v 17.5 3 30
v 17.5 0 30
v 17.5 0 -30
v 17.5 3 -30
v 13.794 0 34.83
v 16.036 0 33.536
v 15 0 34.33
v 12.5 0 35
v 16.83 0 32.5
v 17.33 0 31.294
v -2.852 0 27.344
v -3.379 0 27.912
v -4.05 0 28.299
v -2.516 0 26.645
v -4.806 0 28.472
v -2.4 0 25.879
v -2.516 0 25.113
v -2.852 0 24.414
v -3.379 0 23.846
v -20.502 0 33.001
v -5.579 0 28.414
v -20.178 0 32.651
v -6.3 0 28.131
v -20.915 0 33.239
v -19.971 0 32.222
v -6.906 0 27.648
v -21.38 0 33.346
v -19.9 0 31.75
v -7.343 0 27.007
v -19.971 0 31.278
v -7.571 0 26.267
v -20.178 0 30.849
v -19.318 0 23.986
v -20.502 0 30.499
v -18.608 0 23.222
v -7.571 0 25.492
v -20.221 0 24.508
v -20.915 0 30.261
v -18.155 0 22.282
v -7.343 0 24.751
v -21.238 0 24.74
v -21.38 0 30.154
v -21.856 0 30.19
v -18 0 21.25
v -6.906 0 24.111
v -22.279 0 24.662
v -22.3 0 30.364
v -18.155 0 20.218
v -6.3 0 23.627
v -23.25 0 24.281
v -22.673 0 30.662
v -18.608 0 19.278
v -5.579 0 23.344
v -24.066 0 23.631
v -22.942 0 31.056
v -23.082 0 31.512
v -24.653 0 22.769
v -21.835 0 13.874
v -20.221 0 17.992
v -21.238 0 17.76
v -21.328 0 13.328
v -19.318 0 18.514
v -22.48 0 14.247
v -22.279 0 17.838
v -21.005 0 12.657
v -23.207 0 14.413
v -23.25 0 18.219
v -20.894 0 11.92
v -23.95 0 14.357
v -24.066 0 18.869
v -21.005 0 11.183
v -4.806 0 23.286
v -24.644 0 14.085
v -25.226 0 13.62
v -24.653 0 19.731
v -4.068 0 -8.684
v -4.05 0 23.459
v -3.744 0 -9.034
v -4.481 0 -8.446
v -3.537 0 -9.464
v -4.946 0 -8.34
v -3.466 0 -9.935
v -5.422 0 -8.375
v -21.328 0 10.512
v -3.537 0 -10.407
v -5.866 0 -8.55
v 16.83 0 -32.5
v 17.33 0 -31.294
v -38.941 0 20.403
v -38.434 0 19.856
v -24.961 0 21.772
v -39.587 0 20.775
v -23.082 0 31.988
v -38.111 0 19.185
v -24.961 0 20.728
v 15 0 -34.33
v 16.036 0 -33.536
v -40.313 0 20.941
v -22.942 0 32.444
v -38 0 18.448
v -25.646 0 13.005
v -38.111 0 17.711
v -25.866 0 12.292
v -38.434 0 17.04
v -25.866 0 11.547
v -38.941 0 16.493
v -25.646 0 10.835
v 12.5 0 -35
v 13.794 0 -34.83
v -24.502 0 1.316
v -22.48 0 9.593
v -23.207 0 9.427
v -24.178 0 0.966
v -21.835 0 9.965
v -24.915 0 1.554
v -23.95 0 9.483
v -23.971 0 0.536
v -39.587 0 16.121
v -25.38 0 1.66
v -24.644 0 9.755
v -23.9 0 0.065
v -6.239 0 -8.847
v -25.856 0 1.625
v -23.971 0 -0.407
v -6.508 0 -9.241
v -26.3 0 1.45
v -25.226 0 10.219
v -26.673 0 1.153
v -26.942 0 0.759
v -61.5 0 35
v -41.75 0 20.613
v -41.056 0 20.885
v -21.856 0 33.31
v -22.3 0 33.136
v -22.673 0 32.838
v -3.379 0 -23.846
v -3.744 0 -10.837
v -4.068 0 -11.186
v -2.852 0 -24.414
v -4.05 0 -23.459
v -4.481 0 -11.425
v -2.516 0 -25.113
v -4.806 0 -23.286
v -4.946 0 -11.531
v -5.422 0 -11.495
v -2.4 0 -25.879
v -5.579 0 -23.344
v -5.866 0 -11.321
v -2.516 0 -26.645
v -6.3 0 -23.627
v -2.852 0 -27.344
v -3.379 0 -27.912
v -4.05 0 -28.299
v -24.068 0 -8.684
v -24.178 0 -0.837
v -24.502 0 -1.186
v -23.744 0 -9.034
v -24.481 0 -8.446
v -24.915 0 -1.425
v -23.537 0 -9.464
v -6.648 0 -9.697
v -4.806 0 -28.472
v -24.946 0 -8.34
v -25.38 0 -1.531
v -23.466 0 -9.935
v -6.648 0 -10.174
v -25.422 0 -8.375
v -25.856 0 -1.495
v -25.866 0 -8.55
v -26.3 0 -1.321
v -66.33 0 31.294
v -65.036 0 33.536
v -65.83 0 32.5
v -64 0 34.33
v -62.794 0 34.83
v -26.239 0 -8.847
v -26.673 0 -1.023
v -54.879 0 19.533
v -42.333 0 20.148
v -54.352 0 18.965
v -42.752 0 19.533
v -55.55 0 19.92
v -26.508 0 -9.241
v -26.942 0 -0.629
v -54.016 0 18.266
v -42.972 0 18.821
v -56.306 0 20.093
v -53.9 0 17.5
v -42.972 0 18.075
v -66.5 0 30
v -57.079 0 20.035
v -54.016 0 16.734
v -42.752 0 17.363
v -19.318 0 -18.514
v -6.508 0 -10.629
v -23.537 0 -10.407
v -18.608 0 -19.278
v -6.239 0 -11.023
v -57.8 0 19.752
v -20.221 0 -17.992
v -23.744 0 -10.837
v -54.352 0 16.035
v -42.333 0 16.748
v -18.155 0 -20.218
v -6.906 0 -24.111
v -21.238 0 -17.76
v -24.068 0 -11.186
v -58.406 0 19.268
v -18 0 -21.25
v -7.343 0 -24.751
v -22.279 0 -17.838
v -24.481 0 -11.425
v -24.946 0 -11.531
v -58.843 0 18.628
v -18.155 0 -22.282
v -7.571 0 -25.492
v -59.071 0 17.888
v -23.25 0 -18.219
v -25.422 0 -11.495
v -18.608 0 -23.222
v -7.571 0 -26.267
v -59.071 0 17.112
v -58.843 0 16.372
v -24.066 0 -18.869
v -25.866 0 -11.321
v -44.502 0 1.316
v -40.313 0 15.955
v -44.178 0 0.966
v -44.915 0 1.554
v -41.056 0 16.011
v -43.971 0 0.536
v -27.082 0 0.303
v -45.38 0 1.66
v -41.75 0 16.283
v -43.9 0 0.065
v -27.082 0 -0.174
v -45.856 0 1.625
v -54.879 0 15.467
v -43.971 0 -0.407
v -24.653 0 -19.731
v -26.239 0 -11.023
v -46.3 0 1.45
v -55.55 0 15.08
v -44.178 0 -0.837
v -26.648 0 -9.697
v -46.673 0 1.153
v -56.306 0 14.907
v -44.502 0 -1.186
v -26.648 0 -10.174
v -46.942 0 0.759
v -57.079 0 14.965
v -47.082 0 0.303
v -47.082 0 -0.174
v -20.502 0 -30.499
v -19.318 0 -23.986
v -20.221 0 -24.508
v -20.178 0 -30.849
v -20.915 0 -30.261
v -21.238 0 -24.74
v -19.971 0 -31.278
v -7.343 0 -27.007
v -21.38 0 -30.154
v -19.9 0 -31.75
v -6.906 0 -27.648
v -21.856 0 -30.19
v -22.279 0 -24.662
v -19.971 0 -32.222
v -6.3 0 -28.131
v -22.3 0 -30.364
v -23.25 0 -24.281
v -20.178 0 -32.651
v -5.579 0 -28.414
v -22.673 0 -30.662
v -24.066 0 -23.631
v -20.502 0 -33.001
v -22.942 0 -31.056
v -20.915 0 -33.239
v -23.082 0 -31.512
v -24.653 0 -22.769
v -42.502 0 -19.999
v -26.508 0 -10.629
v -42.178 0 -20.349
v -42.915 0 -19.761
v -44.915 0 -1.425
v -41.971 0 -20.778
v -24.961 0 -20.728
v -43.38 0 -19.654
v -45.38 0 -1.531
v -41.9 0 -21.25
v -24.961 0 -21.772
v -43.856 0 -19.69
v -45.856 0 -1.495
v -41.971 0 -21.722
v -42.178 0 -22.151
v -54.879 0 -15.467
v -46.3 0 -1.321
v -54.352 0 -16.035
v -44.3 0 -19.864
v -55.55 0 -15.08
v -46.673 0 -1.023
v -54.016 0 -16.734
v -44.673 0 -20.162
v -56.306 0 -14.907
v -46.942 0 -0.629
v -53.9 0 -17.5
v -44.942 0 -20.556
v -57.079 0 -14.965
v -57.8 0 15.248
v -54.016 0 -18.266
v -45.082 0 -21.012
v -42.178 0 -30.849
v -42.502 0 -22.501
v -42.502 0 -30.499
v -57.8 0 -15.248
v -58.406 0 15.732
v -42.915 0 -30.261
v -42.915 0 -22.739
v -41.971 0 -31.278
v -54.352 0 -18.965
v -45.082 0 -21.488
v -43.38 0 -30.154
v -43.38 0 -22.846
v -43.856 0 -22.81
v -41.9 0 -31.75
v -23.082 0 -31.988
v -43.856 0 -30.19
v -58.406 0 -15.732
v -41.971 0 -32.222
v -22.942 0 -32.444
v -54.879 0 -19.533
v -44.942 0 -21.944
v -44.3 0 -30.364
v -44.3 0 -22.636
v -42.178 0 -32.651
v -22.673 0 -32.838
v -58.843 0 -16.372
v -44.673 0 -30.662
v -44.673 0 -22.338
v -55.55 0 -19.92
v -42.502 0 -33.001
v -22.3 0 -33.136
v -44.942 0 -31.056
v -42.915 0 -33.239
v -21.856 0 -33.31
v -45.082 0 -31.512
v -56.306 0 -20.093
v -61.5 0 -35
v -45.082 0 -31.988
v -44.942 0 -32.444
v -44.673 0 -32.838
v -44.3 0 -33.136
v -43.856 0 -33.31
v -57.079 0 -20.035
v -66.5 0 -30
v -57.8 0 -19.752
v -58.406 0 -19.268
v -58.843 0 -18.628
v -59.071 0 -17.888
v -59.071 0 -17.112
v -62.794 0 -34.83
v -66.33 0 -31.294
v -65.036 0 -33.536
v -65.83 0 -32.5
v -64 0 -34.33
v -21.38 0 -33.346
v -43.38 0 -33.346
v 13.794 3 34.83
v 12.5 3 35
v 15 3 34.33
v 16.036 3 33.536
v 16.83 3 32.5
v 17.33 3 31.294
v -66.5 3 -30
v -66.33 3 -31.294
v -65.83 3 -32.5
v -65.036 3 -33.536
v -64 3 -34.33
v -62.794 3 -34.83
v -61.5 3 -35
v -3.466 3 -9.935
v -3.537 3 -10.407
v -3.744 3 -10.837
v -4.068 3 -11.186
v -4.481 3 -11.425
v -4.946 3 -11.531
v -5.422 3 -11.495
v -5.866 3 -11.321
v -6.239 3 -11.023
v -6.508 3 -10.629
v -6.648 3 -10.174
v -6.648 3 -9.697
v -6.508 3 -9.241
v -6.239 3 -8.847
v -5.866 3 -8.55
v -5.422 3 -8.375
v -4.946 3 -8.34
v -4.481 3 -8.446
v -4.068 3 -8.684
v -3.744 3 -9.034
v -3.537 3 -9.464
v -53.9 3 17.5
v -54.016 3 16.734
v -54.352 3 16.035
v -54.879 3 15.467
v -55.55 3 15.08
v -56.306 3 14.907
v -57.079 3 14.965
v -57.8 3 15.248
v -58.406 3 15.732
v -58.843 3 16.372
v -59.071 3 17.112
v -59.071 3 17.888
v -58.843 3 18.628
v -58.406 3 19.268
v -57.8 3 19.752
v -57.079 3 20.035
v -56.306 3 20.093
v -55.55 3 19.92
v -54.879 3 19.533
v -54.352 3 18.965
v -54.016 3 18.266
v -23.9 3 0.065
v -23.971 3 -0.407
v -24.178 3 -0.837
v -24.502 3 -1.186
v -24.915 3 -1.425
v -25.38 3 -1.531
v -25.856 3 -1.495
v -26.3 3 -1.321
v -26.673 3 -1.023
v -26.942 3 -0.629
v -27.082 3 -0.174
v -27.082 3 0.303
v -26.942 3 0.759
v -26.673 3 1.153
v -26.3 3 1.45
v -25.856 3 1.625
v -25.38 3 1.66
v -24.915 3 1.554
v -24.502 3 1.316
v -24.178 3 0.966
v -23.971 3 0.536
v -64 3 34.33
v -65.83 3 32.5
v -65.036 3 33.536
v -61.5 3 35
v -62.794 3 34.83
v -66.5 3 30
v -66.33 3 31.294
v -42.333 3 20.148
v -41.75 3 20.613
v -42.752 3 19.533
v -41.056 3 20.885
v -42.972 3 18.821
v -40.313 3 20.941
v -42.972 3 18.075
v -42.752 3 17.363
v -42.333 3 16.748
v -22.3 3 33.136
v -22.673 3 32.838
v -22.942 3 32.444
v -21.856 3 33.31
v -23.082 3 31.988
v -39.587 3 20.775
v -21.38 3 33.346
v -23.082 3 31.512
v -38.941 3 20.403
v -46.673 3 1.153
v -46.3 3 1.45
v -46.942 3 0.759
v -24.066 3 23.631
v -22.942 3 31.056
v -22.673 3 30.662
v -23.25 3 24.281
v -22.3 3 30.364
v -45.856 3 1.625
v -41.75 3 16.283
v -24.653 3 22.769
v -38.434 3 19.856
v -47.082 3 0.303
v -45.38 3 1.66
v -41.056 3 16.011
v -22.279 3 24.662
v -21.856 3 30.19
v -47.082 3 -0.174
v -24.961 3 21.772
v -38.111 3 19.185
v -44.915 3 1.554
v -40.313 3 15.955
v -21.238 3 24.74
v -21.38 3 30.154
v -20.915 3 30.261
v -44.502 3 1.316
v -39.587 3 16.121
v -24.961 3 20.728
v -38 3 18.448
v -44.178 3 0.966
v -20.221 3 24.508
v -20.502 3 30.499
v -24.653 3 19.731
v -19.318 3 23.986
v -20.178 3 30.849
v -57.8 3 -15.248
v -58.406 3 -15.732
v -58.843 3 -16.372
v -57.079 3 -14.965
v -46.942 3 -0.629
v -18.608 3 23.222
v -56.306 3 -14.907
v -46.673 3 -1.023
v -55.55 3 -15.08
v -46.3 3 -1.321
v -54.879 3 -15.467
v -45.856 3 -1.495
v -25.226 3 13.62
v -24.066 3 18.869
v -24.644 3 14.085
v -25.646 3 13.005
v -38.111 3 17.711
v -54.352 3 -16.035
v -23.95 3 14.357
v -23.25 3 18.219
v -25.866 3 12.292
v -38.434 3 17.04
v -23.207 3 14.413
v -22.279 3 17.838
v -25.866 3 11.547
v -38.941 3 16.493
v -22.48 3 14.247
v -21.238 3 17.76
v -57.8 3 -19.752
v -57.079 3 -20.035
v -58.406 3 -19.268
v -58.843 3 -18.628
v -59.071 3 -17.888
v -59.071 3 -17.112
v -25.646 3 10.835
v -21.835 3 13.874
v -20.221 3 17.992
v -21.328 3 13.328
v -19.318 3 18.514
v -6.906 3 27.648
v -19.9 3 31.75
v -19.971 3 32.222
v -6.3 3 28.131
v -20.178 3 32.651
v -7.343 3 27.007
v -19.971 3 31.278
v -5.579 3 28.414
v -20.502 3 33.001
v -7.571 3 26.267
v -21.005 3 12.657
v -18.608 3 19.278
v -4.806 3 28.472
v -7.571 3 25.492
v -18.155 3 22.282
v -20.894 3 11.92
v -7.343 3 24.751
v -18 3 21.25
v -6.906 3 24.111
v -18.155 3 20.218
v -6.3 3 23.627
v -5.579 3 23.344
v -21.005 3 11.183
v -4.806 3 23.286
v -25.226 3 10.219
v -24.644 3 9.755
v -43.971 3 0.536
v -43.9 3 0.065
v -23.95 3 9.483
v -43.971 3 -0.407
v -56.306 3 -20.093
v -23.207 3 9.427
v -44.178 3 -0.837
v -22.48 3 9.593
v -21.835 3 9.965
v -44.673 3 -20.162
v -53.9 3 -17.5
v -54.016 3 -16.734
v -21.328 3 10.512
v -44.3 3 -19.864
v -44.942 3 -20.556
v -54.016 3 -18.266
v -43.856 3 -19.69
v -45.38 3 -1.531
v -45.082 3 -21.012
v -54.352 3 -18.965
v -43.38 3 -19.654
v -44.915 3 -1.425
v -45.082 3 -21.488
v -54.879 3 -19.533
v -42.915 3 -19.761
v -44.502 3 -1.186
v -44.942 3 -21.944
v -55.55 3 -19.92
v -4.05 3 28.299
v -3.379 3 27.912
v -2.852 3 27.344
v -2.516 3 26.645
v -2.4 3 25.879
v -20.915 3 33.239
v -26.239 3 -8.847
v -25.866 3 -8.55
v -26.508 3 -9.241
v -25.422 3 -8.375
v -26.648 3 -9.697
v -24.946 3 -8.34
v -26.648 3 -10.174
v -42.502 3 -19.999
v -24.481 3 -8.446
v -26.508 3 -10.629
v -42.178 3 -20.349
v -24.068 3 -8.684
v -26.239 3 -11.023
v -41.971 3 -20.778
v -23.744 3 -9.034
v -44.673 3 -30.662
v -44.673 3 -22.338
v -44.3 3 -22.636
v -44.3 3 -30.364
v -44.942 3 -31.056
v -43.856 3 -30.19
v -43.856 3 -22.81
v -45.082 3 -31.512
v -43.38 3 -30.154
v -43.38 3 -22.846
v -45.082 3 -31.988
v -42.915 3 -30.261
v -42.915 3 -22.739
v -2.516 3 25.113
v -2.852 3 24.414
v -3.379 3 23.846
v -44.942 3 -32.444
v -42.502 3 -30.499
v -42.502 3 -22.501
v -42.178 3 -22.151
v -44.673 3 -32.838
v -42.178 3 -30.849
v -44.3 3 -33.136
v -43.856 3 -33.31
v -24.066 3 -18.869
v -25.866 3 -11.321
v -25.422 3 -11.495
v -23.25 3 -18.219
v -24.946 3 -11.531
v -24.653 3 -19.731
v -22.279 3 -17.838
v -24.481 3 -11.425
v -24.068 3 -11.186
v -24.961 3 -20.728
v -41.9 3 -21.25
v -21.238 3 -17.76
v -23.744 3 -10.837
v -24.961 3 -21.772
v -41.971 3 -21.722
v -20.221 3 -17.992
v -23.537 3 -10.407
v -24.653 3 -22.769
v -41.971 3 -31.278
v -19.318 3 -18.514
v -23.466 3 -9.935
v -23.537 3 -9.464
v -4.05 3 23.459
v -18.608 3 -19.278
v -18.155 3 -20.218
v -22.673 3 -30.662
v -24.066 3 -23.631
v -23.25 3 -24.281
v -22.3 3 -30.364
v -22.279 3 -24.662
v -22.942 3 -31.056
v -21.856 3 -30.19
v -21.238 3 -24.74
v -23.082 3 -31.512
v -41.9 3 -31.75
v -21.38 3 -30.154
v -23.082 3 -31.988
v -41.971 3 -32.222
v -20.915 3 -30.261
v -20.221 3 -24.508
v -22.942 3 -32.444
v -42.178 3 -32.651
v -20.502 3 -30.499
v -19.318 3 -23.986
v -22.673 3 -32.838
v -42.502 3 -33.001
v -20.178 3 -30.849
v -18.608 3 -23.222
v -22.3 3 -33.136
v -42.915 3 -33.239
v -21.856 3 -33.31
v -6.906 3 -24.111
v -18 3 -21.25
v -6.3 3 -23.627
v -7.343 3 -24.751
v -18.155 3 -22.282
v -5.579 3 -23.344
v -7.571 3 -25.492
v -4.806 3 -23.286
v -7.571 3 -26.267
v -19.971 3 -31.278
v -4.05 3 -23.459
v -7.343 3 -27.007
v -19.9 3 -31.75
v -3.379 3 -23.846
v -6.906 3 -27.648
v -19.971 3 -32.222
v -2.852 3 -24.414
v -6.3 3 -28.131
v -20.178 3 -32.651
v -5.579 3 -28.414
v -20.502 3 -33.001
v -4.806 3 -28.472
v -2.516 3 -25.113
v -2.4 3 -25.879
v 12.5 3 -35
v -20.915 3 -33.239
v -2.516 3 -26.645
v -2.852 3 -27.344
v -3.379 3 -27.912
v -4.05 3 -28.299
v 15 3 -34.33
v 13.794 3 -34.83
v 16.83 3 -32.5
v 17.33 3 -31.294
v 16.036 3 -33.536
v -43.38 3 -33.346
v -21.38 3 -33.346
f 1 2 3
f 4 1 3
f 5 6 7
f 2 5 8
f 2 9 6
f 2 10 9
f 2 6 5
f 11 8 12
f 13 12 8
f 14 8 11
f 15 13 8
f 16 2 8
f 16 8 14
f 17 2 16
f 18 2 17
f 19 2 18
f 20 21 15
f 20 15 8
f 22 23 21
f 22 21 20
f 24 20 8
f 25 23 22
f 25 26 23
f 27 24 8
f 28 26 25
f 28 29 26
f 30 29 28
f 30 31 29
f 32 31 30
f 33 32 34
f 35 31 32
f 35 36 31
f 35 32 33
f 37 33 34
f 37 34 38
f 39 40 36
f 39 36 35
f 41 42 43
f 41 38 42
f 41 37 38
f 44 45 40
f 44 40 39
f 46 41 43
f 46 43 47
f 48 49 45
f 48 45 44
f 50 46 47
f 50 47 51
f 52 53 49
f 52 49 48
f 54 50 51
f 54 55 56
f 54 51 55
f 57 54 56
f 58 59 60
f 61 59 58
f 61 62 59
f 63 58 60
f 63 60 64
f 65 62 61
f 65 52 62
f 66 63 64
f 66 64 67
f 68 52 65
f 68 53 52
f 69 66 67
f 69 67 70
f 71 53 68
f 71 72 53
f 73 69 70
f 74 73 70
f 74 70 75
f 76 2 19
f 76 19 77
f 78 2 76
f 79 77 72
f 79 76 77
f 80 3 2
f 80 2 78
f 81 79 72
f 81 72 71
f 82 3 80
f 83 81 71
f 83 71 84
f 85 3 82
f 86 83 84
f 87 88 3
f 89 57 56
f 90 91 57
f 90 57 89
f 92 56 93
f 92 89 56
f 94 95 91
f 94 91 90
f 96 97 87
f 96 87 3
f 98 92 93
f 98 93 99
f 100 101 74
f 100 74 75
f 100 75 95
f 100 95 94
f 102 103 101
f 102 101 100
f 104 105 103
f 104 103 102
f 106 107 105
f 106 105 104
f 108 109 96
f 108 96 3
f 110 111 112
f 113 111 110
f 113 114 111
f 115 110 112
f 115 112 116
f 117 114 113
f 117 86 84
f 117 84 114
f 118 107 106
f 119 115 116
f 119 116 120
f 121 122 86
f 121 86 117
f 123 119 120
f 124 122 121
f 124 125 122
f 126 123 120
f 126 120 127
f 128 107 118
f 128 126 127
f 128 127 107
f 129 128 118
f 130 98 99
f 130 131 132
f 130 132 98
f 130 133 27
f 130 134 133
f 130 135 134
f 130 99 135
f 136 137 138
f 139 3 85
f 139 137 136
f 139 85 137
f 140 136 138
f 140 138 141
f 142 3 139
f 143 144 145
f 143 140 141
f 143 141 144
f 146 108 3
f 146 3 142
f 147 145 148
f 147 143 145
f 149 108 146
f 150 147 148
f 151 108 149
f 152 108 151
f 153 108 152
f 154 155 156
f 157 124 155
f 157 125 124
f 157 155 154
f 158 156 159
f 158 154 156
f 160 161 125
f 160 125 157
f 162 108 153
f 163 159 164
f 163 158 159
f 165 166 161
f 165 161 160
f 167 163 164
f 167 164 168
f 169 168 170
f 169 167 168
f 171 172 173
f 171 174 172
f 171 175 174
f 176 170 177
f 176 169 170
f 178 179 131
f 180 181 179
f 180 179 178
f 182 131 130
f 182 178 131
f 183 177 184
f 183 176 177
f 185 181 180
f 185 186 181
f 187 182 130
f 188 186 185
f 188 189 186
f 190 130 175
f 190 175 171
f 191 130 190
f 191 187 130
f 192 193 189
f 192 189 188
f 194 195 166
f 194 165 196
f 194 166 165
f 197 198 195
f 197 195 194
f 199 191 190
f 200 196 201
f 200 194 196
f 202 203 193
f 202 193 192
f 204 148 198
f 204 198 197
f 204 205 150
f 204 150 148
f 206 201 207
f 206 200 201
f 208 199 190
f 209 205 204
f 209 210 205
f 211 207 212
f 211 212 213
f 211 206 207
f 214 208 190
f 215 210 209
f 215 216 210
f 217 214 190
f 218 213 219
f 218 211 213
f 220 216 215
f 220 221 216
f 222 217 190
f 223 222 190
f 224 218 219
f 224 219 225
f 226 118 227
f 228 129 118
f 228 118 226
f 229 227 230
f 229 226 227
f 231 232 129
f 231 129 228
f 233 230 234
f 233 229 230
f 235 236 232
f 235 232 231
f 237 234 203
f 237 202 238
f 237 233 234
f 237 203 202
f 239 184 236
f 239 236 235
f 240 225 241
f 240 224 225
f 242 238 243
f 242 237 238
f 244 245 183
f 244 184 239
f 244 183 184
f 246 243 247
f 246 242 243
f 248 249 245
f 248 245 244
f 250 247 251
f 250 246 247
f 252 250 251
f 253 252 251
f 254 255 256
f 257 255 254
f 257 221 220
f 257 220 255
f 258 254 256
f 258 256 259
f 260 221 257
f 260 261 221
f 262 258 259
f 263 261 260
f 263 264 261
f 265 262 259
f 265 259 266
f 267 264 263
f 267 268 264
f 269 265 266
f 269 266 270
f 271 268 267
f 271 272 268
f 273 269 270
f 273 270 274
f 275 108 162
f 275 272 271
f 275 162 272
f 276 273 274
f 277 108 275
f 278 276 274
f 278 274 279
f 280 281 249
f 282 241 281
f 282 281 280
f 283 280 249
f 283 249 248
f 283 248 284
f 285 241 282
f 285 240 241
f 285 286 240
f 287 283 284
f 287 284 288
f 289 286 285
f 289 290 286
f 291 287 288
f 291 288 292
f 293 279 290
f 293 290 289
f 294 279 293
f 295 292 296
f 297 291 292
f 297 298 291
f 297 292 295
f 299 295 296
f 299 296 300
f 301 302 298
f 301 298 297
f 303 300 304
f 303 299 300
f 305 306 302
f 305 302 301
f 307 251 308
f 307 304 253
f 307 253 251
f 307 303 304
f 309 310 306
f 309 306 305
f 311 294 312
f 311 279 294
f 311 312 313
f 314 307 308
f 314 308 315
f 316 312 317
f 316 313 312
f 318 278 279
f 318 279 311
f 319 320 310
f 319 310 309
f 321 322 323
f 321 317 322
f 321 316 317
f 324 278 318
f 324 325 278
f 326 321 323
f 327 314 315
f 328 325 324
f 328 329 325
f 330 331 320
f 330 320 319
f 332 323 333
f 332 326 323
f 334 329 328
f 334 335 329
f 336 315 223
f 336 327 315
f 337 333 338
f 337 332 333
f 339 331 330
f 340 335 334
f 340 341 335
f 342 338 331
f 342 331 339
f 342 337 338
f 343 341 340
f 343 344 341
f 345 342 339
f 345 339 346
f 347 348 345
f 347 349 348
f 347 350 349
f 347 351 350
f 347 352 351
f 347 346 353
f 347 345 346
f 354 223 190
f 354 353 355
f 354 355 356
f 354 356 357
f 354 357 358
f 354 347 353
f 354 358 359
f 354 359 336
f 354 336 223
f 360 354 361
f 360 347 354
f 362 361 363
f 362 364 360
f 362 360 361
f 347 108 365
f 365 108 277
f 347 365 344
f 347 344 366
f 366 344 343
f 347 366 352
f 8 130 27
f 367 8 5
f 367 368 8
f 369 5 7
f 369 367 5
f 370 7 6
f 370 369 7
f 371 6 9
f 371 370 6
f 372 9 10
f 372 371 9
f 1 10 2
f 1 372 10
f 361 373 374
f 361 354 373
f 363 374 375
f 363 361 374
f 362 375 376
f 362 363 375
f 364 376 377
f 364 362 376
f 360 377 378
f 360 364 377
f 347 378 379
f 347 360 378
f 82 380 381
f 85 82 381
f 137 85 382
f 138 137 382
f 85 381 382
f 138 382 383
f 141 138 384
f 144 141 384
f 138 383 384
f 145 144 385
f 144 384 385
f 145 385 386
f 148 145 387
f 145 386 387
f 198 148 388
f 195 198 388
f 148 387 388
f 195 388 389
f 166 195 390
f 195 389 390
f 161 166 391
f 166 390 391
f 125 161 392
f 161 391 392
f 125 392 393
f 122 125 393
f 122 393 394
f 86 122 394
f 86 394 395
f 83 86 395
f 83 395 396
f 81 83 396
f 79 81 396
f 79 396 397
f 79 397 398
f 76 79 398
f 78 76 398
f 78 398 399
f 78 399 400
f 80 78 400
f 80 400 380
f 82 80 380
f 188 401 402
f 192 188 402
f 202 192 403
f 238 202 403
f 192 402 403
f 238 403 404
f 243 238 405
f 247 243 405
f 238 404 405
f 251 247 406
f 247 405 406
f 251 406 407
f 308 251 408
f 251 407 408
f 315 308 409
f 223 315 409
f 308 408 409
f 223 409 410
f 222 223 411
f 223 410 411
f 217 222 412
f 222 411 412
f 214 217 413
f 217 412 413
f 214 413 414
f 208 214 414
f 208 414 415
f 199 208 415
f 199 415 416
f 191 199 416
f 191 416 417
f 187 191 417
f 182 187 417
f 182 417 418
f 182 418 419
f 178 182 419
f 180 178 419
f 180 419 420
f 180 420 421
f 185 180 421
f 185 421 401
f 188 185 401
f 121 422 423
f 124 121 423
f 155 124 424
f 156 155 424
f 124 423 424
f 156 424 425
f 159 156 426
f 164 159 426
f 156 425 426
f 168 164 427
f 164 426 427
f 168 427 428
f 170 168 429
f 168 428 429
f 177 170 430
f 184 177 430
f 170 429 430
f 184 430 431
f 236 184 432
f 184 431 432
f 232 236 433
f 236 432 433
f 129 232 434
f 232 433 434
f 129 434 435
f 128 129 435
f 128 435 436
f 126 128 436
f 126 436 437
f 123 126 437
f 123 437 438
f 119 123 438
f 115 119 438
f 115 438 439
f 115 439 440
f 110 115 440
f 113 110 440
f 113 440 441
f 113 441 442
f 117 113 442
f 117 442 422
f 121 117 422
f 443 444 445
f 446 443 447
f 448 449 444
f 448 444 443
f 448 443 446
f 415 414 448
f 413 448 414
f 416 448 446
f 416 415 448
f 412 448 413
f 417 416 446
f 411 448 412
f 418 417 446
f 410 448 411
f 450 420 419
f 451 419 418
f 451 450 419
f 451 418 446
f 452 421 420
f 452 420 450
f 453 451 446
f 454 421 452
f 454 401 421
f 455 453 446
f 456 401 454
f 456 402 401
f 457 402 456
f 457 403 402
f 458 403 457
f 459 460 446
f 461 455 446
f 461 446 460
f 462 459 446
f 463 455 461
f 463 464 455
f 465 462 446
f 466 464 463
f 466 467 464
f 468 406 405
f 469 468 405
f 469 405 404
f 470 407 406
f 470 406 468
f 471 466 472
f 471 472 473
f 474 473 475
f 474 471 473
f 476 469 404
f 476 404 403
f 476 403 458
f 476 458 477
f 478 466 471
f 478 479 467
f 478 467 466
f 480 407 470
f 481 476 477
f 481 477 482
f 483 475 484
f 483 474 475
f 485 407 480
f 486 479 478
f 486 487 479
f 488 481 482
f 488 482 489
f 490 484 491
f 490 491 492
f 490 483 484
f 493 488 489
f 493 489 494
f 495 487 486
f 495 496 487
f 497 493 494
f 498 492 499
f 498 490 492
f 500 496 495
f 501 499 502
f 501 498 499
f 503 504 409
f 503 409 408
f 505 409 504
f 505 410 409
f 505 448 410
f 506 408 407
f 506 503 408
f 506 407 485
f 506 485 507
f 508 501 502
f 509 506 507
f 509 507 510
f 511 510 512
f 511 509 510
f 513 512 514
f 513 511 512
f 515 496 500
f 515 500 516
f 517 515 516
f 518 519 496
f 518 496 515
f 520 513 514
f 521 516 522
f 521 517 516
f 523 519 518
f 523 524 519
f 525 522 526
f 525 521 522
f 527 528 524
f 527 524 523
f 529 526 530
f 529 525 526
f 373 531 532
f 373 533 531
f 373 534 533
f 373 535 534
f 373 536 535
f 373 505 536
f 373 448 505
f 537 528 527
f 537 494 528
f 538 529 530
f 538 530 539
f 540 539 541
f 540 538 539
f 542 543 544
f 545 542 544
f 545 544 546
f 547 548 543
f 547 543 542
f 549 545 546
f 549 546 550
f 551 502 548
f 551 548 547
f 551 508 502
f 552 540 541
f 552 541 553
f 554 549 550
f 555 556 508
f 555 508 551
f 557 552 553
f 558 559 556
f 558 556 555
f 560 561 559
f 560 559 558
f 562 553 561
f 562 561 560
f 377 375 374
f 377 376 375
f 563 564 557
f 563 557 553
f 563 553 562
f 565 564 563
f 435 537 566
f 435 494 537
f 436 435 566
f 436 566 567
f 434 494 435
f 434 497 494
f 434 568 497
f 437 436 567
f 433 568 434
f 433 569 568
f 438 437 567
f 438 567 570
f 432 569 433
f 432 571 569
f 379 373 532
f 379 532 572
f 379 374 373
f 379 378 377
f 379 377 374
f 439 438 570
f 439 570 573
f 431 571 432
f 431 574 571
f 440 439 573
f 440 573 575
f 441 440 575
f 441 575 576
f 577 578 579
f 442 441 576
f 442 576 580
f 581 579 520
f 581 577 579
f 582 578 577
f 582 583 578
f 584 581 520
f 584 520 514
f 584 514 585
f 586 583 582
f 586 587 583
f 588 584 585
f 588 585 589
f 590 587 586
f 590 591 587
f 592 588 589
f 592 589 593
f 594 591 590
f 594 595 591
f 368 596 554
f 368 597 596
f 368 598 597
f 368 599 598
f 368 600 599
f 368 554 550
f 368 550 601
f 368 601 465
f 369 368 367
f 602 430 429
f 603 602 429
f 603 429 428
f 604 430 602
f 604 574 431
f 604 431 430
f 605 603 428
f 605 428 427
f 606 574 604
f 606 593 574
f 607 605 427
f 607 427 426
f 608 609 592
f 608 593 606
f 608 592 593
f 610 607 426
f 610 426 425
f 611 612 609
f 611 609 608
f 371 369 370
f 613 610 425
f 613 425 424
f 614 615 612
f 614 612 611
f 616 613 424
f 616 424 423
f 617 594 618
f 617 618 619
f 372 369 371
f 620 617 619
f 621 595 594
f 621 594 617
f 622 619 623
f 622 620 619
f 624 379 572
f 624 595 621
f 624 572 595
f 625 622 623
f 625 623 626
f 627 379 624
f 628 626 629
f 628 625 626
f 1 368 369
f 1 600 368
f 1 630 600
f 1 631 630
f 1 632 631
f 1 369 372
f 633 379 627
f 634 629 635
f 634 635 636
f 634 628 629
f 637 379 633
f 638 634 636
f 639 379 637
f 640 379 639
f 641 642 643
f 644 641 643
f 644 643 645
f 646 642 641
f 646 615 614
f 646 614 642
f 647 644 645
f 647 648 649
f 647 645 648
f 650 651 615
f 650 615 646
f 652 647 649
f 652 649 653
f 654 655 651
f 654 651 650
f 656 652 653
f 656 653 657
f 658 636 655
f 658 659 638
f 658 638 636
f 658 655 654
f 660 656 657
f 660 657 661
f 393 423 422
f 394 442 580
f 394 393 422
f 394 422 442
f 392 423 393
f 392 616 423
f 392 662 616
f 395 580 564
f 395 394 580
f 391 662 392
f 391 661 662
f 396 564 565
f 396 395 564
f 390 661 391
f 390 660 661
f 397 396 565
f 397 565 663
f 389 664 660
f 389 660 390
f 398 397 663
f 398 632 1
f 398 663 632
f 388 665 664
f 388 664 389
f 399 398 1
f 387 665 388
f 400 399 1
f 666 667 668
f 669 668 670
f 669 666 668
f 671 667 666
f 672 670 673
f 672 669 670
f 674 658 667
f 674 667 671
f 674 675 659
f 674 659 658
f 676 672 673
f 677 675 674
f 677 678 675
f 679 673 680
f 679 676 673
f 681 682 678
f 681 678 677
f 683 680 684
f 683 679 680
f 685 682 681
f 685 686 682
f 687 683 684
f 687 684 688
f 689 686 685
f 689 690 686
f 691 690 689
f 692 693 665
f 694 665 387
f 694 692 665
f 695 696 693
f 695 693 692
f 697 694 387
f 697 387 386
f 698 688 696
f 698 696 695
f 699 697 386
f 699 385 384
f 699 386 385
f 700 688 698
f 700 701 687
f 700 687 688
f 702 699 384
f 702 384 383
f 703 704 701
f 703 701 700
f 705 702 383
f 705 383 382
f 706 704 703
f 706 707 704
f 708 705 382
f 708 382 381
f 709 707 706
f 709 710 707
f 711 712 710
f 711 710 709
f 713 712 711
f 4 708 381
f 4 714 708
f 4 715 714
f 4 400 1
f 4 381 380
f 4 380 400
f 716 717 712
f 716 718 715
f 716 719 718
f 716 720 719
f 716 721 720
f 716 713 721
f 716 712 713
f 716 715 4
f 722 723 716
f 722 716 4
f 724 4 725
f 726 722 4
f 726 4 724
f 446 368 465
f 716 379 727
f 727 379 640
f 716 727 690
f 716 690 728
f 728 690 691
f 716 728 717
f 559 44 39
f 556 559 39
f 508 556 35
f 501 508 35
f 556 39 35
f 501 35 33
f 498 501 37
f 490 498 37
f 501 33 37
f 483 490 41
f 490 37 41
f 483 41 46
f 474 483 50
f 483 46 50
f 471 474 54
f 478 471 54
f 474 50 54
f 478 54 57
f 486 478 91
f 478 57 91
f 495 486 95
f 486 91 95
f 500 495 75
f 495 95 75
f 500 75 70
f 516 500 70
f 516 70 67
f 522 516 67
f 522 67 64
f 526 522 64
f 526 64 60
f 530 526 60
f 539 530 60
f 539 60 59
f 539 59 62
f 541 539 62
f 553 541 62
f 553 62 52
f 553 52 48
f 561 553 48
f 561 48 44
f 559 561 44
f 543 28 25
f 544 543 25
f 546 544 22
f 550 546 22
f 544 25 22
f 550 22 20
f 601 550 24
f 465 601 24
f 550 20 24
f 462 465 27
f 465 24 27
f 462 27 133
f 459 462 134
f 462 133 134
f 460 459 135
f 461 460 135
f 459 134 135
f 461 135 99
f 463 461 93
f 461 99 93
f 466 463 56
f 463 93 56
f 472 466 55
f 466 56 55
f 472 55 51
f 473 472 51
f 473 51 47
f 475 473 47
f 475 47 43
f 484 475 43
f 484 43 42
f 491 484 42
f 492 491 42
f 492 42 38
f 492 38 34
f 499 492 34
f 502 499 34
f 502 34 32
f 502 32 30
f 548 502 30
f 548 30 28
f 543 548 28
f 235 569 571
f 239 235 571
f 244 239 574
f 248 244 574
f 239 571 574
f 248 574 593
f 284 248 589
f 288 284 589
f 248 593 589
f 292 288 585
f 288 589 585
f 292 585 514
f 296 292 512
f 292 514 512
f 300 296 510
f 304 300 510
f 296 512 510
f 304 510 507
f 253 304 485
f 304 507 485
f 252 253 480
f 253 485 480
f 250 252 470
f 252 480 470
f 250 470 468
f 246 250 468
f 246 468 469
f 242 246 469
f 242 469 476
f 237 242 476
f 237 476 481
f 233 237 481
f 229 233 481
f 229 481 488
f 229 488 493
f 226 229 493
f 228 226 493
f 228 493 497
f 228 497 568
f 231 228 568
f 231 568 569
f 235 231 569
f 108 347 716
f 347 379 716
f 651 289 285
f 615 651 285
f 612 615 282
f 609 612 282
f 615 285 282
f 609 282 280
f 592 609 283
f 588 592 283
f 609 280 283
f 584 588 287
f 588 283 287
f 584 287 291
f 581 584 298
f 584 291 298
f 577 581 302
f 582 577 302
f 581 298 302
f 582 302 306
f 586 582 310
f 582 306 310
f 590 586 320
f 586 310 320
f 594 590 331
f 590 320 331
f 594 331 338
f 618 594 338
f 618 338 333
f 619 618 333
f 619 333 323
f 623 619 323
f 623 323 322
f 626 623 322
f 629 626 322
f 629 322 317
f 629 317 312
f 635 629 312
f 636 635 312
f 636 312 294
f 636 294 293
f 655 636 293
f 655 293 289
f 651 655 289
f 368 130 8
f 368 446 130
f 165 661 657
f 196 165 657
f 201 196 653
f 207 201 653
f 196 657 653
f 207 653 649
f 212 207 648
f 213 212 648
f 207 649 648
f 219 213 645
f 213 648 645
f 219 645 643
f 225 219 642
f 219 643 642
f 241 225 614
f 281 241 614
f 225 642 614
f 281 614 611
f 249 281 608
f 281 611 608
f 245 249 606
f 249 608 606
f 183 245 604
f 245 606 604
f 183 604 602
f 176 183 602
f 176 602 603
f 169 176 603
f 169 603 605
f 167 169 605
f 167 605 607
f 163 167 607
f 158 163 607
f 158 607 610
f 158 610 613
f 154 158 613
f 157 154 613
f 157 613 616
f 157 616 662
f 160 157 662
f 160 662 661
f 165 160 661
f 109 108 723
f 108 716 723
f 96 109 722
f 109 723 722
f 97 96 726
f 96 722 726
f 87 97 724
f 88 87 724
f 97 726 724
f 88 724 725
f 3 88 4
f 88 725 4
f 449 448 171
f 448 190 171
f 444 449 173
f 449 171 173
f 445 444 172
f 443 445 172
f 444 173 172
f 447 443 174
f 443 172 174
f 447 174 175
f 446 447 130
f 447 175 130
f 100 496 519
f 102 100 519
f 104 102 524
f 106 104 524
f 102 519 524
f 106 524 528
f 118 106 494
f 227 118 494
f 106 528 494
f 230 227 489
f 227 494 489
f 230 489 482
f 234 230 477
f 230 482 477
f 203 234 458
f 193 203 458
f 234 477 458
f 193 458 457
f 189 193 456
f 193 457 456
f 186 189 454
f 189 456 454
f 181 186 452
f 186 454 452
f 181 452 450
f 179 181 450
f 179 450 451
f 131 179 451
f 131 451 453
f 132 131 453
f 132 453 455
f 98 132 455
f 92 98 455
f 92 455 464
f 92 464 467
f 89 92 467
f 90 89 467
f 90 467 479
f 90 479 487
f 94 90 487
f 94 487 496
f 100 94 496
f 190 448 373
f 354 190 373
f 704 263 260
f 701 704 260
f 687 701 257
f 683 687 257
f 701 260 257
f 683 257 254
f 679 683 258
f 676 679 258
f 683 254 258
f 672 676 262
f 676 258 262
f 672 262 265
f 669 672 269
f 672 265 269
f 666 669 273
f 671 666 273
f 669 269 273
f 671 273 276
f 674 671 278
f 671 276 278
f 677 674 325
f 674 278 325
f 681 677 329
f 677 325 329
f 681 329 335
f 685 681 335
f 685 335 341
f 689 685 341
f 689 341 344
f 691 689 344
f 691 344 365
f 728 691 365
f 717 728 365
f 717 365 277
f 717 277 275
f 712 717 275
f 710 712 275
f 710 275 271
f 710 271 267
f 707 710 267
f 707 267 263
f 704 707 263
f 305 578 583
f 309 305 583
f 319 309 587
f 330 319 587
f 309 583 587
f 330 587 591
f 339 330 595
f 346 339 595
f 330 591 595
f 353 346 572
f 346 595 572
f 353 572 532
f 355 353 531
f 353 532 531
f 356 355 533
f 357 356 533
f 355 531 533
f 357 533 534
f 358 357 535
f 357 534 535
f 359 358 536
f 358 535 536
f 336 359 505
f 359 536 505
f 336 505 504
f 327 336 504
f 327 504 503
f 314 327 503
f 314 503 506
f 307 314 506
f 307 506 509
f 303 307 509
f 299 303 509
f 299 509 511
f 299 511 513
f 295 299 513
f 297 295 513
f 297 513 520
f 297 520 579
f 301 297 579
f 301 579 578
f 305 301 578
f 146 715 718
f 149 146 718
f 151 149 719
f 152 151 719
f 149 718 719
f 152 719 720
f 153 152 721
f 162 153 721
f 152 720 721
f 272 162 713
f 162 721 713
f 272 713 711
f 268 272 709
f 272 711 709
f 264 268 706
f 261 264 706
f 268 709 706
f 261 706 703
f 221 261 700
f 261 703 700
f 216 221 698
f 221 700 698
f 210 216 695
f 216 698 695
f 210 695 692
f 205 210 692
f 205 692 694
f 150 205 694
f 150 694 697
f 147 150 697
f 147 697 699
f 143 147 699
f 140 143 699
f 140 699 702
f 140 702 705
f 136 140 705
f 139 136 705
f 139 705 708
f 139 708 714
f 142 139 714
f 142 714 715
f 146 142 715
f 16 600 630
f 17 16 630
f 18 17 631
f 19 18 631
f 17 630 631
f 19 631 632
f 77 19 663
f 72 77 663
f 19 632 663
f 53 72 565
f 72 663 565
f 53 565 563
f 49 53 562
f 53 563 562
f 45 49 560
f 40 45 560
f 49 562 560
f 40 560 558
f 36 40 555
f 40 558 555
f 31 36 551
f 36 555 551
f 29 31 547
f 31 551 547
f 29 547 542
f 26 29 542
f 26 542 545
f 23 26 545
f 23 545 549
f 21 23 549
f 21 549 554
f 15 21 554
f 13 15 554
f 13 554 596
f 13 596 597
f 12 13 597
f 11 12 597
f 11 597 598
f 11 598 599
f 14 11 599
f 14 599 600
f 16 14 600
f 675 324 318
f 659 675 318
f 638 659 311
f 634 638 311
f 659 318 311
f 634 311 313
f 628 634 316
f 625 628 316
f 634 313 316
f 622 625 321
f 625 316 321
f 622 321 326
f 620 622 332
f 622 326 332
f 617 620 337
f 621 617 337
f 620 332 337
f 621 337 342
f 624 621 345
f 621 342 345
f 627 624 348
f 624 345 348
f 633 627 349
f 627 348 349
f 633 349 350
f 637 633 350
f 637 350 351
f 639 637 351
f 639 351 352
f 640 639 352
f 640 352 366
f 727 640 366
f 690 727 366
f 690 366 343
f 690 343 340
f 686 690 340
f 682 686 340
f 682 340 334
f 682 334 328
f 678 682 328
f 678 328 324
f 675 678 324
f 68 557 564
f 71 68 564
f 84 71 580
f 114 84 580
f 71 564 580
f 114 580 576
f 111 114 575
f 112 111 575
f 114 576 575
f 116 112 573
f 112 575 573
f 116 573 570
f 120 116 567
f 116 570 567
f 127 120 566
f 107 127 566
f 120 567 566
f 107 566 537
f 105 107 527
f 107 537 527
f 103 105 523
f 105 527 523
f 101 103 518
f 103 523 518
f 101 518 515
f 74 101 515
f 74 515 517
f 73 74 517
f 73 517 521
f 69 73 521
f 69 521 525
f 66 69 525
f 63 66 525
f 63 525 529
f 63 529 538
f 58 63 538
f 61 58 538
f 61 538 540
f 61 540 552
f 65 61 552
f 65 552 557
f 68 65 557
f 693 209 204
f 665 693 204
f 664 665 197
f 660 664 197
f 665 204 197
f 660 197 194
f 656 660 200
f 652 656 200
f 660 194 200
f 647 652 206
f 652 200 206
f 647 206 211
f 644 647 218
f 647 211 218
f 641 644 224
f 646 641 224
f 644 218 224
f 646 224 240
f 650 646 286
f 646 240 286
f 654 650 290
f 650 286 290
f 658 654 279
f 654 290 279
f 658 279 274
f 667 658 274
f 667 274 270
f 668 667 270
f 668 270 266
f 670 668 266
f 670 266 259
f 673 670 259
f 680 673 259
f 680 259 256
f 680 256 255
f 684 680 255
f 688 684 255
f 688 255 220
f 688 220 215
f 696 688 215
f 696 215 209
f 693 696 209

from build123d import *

# Parameters (mm, degrees)
SKETCH_1_W             = 35
SKETCH_1_H             = 70
SKETCH_1_R             = 2.6
EXTRUDE_528_DEPTH      = 3
SKETCH_2_R             = 2.1
CUT_EXTRUDE_M4_DEPTH   = 3
SKETCH_3_R             = 2.6
EXTRUDE_990_DEPTH      = 3
SKETCH_4_R             = 2.1
CUT_EXTRUDE_1335_DEPTH = 4
SKETCH_5_W             = 49
SKETCH_5_H             = 70
EXTRA_DEPTH            = 3
SKETCH_6_R             = 2.1
CUT_EXTRUDE_2079_DEPTH = 10
SKETCH_7_R             = 2.1
ETRA_DEPTH             = 10
SKETCH_10_R            = 1.6
SKETCH_10_R_2          = 3.5
CUT_EXTRUDE_3705_DEPTH = 4
FILLET_5_0_R           = 5
SKETCH_12_R            = 2.1
EXTRUDE_1_DEPTH        = 3
SKETCH_13_R            = 1.5
CUT_EXTRUDE_1_DEPTH    = 4
SKETCH_14_R            = 1.5
EXTRUDE_2_DEPTH        = 3
SKETCH_15_R            = 2.5
CUT_EXTRUDE_2_DEPTH    = 4
SKETCH_16_R            = 2.6
EXTRUDE_3_DEPTH        = 3
SKETCH_18_R            = 2.5
CUT_EXTRUDE_3_DEPTH    = 3
SKETCH_19_R            = 2.180798689
SKETCH_19_R_2          = 1.661770768
EXTRUDE_4_DEPTH        = 3
SKETCH_20_R            = 2.5
CUT_EXTRUDE_4_DEPTH    = 4
SKETCH_21_R            = 1.5
SKETCH_21_R_2          = 2.5
SKETCH_21_R_3          = 2.1
EXTRUDE_5_DEPTH        = 3
SKETCH_22_R            = 1.5
CUT_EXTRUDE_5_DEPTH    = 4
SKETCH_23_R            = 1.5
EXTRUDE_6_DEPTH        = 3
SKETCH_24_R            = 1.2
CUT_EXTRUDE_8_DEPTH    = 4
SKETCH_26_R            = 1.5
CUT_EXTRUDE_10_DEPTH   = 4
SKETCH_27_R            = 1.2
SKETCH_27_R_2          = 1.228912634
EXTRUDE_7_DEPTH        = 3
SKETCH_28_R            = 2.5
EXTRUDE_8_DEPTH        = 3
SKETCH_29_R            = 1.2
CUT_EXTRUDE_11_DEPTH   = 4
SKETCH_30_R            = 1.5
EXTRUDE_9_DEPTH        = 3
SKETCH_31_R            = 2.5
CUT_EXTRUDE_12_DEPTH   = 4
SKETCH_32_R            = 2.622023652
SKETCH_32_R_2          = 2.1
EXTRUDE_10_DEPTH       = 3
SKETCH_34_R            = 2.5
EXTRUDE_11_DEPTH       = 3
SKETCH_35_R            = 1.2
CUT_EXTRUDE_13_DEPTH   = 4
SKETCH_37_R            = 1.6
SKETCH_37_R_2          = 2.6
CUT_EXTRUDE_14_DEPTH   = 4


with BuildPart() as part:
    # 草图1 → Extrude 528 (new body)
    with BuildSketch(Plane(origin=(0, 0, 0), x_dir=(1, 0, 0), z_dir=(0, 1, 0))):
        Rectangle(SKETCH_1_W, SKETCH_1_H)
        with Locations((-7.5, 22.5)):
            Circle(SKETCH_1_R, mode=Mode.SUBTRACT)
        with Locations((-7.5, 0)):
            Circle(SKETCH_1_R, mode=Mode.SUBTRACT)
        with Locations((-7.5, -22.5)):
            Circle(SKETCH_1_R, mode=Mode.SUBTRACT)
        with Locations((-7.5, 10)):
            Circle(SKETCH_1_R, mode=Mode.SUBTRACT)
        with Locations((-7.5, -10)):
            Circle(SKETCH_1_R, mode=Mode.SUBTRACT)
    extrude(amount=EXTRUDE_528_DEPTH)

    # 草图2 → M4铝柱 (cut)
    with BuildSketch(Plane(origin=(0, 3, 0), x_dir=(1, 0, 0), z_dir=(0, 1, 0))):
        with Locations((10, 0)):
            Circle(SKETCH_2_R)
    extrude(amount=-CUT_EXTRUDE_M4_DEPTH, mode=Mode.SUBTRACT)

    # 草图3 → Extrude 990 (add, through all)
    with BuildSketch(Plane(origin=(0, 3, 0), x_dir=(1, 0, 0), z_dir=(0, 1, 0))):
        with Locations((-7.5, -10)):
            Circle(SKETCH_3_R)
        with Locations((-7.5, 10)):
            Circle(SKETCH_3_R)
    extrude(amount=-EXTRUDE_990_DEPTH)

    # 草图4 → Cut-Extrude 1335 (cut, through all)
    with BuildSketch(Plane(origin=(0, 3, 0), x_dir=(1, 0, 0), z_dir=(0, 1, 0))):
        with Locations((10, 22.5)):
            Circle(SKETCH_4_R)
        with Locations((10, -22.5)):
            Circle(SKETCH_4_R)
    extrude(amount=-CUT_EXTRUDE_1335_DEPTH, mode=Mode.SUBTRACT)

    # 草图5 → EXTRA (add, through all)
    with BuildSketch(Plane(origin=(0, 3, 0), x_dir=(1, 0, 0), z_dir=(0, 1, 0))):
        with Locations((-42, 0)):
            Rectangle(SKETCH_5_W, SKETCH_5_H)
    extrude(amount=-EXTRA_DEPTH)

    # 草图6 → Cut-Extrude 2079 (cut)
    with BuildSketch(Plane(origin=(0, 3, 0), x_dir=(1, 0, 0), z_dir=(0, 1, 0))):
        with Locations((-44.5, 0)):
            Circle(SKETCH_6_R)
        with Locations((-36.5, 0)):
            Circle(SKETCH_6_R)
    extrude(amount=-CUT_EXTRUDE_2079_DEPTH, mode=Mode.SUBTRACT)

    # 草图7 → ETRA铝柱 (cut)
    with BuildSketch(Plane(origin=(0, 3, 0), x_dir=(1, 0, 0), z_dir=(0, 1, 0))):
        with Locations((-56.5, 17.5)):
            Circle(SKETCH_7_R)
        with Locations((-56.5, -17.5)):
            Circle(SKETCH_7_R)
    extrude(amount=-ETRA_DEPTH, mode=Mode.SUBTRACT)

    # 草图10 → Cut-Extrude 3705 (cut, through all)
    with BuildSketch(Plane.XZ):
        with Locations((-43.5, -21.25)):
            Circle(SKETCH_10_R)
        with Locations((-21.5, -31.75)):
            Circle(SKETCH_10_R)
        with Locations((-43.5, -31.75)):
            Circle(SKETCH_10_R)
        with Locations((-43.5, 21.25)):
            Circle(SKETCH_10_R)
        with Locations((-21.5, 31.75)):
            Circle(SKETCH_10_R)
        with Locations((-43.5, 31.75)):
            Circle(SKETCH_10_R)
        with Locations((-21.5, 21.25)):
            Circle(SKETCH_10_R_2)
        with Locations((-21.5, -21.25)):
            Circle(SKETCH_10_R_2)
    extrude(amount=-CUT_EXTRUDE_3705_DEPTH, mode=Mode.SUBTRACT)

    # 圆角5.0
    fillet_5_0_edges = [part.edges().sort_by_distance(p)[0] for p in [
        (-66.5, 1.5, 35),
        (-66.5, 1.5, -35),
        (17.5, 1.5, 35),
        (17.5, 1.5, -35),
    ]]
    fillet(fillet_5_0_edges, radius=FILLET_5_0_R)

    # 草图12 → 凸台-拉伸1 (add)
    with BuildSketch(Plane(origin=(0, 3, 0), x_dir=(1, 0, 0), z_dir=(0, 1, 0))):
        with Locations((-36.5, 0)):
            Circle(SKETCH_12_R)
        with Locations((-44.5, 0)):
            Circle(SKETCH_12_R)
    extrude(amount=-EXTRUDE_1_DEPTH)

    # 草图13 → 切除-拉伸1 (cut, through all)
    with BuildSketch(Plane(origin=(0, 3, 0), x_dir=(1, 0, 0), z_dir=(0, 1, 0))):
        with Locations((-52.499999555, 1.426e-06)):
            Circle(SKETCH_13_R)
        with Locations((-28.499999555, 1.44e-06)):
            Circle(SKETCH_13_R)
    extrude(amount=-CUT_EXTRUDE_1_DEPTH, mode=Mode.SUBTRACT)

    # 草图14 → 凸台-拉伸2 (add)
    with BuildSketch(Plane(origin=(0, 3, 0), x_dir=(1, 0, 0), z_dir=(0, 1, 0))):
        with Locations((-28.499999555, 1.44e-06)):
            Circle(SKETCH_14_R)
    extrude(amount=-EXTRUDE_2_DEPTH)

    # 草图15 → 切除-拉伸2 (cut, through all)
    with BuildSketch(Plane(origin=(0, 3, 0), x_dir=(1, 0, 0), z_dir=(0, 1, 0))):
        with Locations((-23.393651392, 12.166497951)):
            Circle(SKETCH_15_R)
        with Locations((-23.393651594, -11.919830539)):
            Circle(SKETCH_15_R)
    extrude(amount=-CUT_EXTRUDE_2_DEPTH, mode=Mode.SUBTRACT)

    # 草图16 → 凸台-拉伸3 (add)
    with BuildSketch(Plane(origin=(0, 3, 0), x_dir=(1, 0, 0), z_dir=(0, 1, 0))):
        with Locations((-7.5, 22.5)):
            Circle(SKETCH_16_R)
        with Locations((-7.5, 0)):
            Circle(SKETCH_16_R)
        with Locations((-7.5, -22.5)):
            Circle(SKETCH_16_R)
    extrude(amount=-EXTRUDE_3_DEPTH)

    # 草图18 → 切除-拉伸3 (cut)
    with BuildSketch(Plane.XZ):
        with Locations((-3.558761246, 0)):
            Circle(SKETCH_18_R)
        with Locations((-3.558761246, 22.202338419)):
            Circle(SKETCH_18_R)
        with Locations((-3.558761246, -23.518793957)):
            Circle(SKETCH_18_R)
    extrude(amount=-CUT_EXTRUDE_3_DEPTH, mode=Mode.SUBTRACT)

    # 草图19 → 凸台-拉伸4 (add)
    with BuildSketch(Plane.XZ):
        with Locations((-43.5, 21.25)):
            Circle(SKETCH_19_R)
        with Locations((-43.5, 31.75)):
            Circle(SKETCH_19_R_2)
    extrude(amount=-EXTRUDE_4_DEPTH)

    # 草图20 → 切除-拉伸4 (cut, through all)
    with BuildSketch(Plane(origin=(0, 3, 0), x_dir=(1, 0, 0), z_dir=(0, 1, 0))):
        with Locations((-40.5, 1.551947464)):
            Circle(SKETCH_20_R)
        with Locations((-40.5, -18.448052536)):
            Circle(SKETCH_20_R)
    extrude(amount=-CUT_EXTRUDE_4_DEPTH, mode=Mode.SUBTRACT)

    # 草图21 → 凸台-拉伸5 (add)
    with BuildSketch(Plane(origin=(0, 3, 0), x_dir=(1, 0, 0), z_dir=(0, 1, 0))):
        with Locations((-52.499999555, 1.426e-06)):
            Circle(SKETCH_21_R)
        with Locations((-40.5, 1.551947464)):
            Circle(SKETCH_21_R_2)
        with Locations((-3.558761246, 0)):
            Circle(SKETCH_21_R_2)
        with Locations((10, 0)):
            Circle(SKETCH_21_R_3)
    extrude(amount=-EXTRUDE_5_DEPTH)

    # 草图22 → 切除-拉伸5 (cut, through all)
    with BuildSketch(Plane(origin=(0, 3, 0), x_dir=(1, 0, 0), z_dir=(0, 1, 0))):
        with Locations((-52.5, 0)):
            Circle(SKETCH_22_R)
        with Locations((-28.5, 0)):
            Circle(SKETCH_22_R)
    extrude(amount=-CUT_EXTRUDE_5_DEPTH, mode=Mode.SUBTRACT)

    # 草图23 → 凸台-拉伸6 (add)
    with BuildSketch(Plane(origin=(0, 3, 0), x_dir=(1, 0, 0), z_dir=(0, 1, 0))):
        with Locations((-52.5, 0)):
            Circle(SKETCH_23_R)
        with Locations((-28.5, 0)):
            Circle(SKETCH_23_R)
    extrude(amount=-EXTRUDE_6_DEPTH)

    # 草图24 → 切除-拉伸8 (cut, through all)
    with BuildSketch(Plane(origin=(0, 3, 0), x_dir=(1, 0, 0), z_dir=(0, 1, 0))):
        with Locations((-45.5, -0.064794531)):
            Circle(SKETCH_24_R)
        with Locations((-25.5, -0.064794531)):
            Circle(SKETCH_24_R)
    extrude(amount=-CUT_EXTRUDE_8_DEPTH, mode=Mode.SUBTRACT)

    # 草图26 → 切除-拉伸10 (cut, through all)
    with BuildSketch(Plane.XZ):
        with Locations((-52.5, 0)):
            Circle(SKETCH_26_R)
        with Locations((-28.5, 0)):
            Circle(SKETCH_26_R)
    extrude(amount=-CUT_EXTRUDE_10_DEPTH, mode=Mode.SUBTRACT)

    # 草图27 → 凸台-拉伸7 (add)
    with BuildSketch(Plane(origin=(0, 0, 0), x_dir=(-1, 0, 0), z_dir=(0, -1, 0))):
        with Locations((25.5, -0.064794531)):
            Circle(SKETCH_27_R)
        with Locations((45.5, -0.064794531)):
            Circle(SKETCH_27_R_2)
    extrude(amount=-EXTRUDE_7_DEPTH)

    # 草图28 → 凸台-拉伸8 (add)
    with BuildSketch(Plane(origin=(0, 3, 0), x_dir=(1, 0, 0), z_dir=(0, 1, 0))):
        with Locations((-3.558761246, -22.202338419)):
            Circle(SKETCH_28_R)
        with Locations((-3.558761246, 23.518793957)):
            Circle(SKETCH_28_R)
    extrude(amount=-EXTRUDE_8_DEPTH)

    # 草图29 → 切除-拉伸11 (cut, through all)
    with BuildSketch(Plane(origin=(0, 3, 0), x_dir=(1, 0, 0), z_dir=(0, 1, 0))):
        with Locations((-25.5, -0.064794531)):
            Circle(SKETCH_29_R)
        with Locations((-45.5, -0.064794531)):
            Circle(SKETCH_29_R)
    extrude(amount=-CUT_EXTRUDE_11_DEPTH, mode=Mode.SUBTRACT)

    # 草图30 → 凸台-拉伸9 (add)
    with BuildSketch(Plane(origin=(0, 3, 0), x_dir=(1, 0, 0), z_dir=(0, 1, 0))):
        with Locations((-28.5, 0)):
            Circle(SKETCH_30_R)
        with Locations((-52.5, 0)):
            Circle(SKETCH_30_R)
    extrude(amount=-EXTRUDE_9_DEPTH)

    # 草图31 → 切除-拉伸12 (cut, through all)
    with BuildSketch(Plane.XZ):
        with Locations((-5, 25.879055361)):
            Circle(SKETCH_31_R)
        with Locations((-5, -25.879055361)):
            Circle(SKETCH_31_R)
    extrude(amount=-CUT_EXTRUDE_12_DEPTH, mode=Mode.SUBTRACT)

    # 草图32 → 凸台-拉伸10 (add)
    with BuildSketch(Plane(origin=(0, 3, 0), x_dir=(1, 0, 0), z_dir=(0, 1, 0))):
        with Locations((10, -22.5)):
            Circle(SKETCH_32_R)
        with Locations((10, 22.5)):
            Circle(SKETCH_32_R_2)
    extrude(amount=-EXTRUDE_10_DEPTH)

    # 草图34 → 凸台-拉伸11 (add)
    with BuildSketch(Plane(origin=(0, 3, 0), x_dir=(1, 0, 0), z_dir=(0, 1, 0))):
        with Locations((-23.393651392, 12.166497951)):
            Circle(SKETCH_34_R)
    extrude(amount=-EXTRUDE_11_DEPTH)

    # 草图35 → 切除-拉伸13 (cut, through all)
    with BuildSketch(Plane(origin=(0, 3, 0), x_dir=(1, 0, 0), z_dir=(0, 1, 0))):
        with Locations((-5.06603585, 9.935205469)):
            Circle(SKETCH_35_R)
        with Locations((-25.06603585, 9.935205469)):
            Circle(SKETCH_35_R)
    extrude(amount=-CUT_EXTRUDE_13_DEPTH, mode=Mode.SUBTRACT)

    # 草图37 → 切除-拉伸14 (cut, through all)
    with BuildSketch(Plane(origin=(0, 3, 0), x_dir=(1, 0, 0), z_dir=(0, 1, 0))):
        with Locations((-45.5, -0.064794531)):
            Circle(SKETCH_37_R)
        with Locations((-25.5, -0.064794531)):
            Circle(SKETCH_37_R)
        with Locations((-25.06603585, 9.935205469)):
            Circle(SKETCH_37_R)
        with Locations((-5.06603585, 9.935205469)):
            Circle(SKETCH_37_R)
        with Locations((-5, 25.879055361)):
            Circle(SKETCH_37_R_2)
        with Locations((-5, -25.879055361)):
            Circle(SKETCH_37_R_2)
        with Locations((-56.5, 17.5)):
            Circle(SKETCH_37_R_2)
        with Locations((-56.5, -17.5)):
            Circle(SKETCH_37_R_2)
    extrude(amount=-CUT_EXTRUDE_14_DEPTH, mode=Mode.SUBTRACT)


solid = part.part
